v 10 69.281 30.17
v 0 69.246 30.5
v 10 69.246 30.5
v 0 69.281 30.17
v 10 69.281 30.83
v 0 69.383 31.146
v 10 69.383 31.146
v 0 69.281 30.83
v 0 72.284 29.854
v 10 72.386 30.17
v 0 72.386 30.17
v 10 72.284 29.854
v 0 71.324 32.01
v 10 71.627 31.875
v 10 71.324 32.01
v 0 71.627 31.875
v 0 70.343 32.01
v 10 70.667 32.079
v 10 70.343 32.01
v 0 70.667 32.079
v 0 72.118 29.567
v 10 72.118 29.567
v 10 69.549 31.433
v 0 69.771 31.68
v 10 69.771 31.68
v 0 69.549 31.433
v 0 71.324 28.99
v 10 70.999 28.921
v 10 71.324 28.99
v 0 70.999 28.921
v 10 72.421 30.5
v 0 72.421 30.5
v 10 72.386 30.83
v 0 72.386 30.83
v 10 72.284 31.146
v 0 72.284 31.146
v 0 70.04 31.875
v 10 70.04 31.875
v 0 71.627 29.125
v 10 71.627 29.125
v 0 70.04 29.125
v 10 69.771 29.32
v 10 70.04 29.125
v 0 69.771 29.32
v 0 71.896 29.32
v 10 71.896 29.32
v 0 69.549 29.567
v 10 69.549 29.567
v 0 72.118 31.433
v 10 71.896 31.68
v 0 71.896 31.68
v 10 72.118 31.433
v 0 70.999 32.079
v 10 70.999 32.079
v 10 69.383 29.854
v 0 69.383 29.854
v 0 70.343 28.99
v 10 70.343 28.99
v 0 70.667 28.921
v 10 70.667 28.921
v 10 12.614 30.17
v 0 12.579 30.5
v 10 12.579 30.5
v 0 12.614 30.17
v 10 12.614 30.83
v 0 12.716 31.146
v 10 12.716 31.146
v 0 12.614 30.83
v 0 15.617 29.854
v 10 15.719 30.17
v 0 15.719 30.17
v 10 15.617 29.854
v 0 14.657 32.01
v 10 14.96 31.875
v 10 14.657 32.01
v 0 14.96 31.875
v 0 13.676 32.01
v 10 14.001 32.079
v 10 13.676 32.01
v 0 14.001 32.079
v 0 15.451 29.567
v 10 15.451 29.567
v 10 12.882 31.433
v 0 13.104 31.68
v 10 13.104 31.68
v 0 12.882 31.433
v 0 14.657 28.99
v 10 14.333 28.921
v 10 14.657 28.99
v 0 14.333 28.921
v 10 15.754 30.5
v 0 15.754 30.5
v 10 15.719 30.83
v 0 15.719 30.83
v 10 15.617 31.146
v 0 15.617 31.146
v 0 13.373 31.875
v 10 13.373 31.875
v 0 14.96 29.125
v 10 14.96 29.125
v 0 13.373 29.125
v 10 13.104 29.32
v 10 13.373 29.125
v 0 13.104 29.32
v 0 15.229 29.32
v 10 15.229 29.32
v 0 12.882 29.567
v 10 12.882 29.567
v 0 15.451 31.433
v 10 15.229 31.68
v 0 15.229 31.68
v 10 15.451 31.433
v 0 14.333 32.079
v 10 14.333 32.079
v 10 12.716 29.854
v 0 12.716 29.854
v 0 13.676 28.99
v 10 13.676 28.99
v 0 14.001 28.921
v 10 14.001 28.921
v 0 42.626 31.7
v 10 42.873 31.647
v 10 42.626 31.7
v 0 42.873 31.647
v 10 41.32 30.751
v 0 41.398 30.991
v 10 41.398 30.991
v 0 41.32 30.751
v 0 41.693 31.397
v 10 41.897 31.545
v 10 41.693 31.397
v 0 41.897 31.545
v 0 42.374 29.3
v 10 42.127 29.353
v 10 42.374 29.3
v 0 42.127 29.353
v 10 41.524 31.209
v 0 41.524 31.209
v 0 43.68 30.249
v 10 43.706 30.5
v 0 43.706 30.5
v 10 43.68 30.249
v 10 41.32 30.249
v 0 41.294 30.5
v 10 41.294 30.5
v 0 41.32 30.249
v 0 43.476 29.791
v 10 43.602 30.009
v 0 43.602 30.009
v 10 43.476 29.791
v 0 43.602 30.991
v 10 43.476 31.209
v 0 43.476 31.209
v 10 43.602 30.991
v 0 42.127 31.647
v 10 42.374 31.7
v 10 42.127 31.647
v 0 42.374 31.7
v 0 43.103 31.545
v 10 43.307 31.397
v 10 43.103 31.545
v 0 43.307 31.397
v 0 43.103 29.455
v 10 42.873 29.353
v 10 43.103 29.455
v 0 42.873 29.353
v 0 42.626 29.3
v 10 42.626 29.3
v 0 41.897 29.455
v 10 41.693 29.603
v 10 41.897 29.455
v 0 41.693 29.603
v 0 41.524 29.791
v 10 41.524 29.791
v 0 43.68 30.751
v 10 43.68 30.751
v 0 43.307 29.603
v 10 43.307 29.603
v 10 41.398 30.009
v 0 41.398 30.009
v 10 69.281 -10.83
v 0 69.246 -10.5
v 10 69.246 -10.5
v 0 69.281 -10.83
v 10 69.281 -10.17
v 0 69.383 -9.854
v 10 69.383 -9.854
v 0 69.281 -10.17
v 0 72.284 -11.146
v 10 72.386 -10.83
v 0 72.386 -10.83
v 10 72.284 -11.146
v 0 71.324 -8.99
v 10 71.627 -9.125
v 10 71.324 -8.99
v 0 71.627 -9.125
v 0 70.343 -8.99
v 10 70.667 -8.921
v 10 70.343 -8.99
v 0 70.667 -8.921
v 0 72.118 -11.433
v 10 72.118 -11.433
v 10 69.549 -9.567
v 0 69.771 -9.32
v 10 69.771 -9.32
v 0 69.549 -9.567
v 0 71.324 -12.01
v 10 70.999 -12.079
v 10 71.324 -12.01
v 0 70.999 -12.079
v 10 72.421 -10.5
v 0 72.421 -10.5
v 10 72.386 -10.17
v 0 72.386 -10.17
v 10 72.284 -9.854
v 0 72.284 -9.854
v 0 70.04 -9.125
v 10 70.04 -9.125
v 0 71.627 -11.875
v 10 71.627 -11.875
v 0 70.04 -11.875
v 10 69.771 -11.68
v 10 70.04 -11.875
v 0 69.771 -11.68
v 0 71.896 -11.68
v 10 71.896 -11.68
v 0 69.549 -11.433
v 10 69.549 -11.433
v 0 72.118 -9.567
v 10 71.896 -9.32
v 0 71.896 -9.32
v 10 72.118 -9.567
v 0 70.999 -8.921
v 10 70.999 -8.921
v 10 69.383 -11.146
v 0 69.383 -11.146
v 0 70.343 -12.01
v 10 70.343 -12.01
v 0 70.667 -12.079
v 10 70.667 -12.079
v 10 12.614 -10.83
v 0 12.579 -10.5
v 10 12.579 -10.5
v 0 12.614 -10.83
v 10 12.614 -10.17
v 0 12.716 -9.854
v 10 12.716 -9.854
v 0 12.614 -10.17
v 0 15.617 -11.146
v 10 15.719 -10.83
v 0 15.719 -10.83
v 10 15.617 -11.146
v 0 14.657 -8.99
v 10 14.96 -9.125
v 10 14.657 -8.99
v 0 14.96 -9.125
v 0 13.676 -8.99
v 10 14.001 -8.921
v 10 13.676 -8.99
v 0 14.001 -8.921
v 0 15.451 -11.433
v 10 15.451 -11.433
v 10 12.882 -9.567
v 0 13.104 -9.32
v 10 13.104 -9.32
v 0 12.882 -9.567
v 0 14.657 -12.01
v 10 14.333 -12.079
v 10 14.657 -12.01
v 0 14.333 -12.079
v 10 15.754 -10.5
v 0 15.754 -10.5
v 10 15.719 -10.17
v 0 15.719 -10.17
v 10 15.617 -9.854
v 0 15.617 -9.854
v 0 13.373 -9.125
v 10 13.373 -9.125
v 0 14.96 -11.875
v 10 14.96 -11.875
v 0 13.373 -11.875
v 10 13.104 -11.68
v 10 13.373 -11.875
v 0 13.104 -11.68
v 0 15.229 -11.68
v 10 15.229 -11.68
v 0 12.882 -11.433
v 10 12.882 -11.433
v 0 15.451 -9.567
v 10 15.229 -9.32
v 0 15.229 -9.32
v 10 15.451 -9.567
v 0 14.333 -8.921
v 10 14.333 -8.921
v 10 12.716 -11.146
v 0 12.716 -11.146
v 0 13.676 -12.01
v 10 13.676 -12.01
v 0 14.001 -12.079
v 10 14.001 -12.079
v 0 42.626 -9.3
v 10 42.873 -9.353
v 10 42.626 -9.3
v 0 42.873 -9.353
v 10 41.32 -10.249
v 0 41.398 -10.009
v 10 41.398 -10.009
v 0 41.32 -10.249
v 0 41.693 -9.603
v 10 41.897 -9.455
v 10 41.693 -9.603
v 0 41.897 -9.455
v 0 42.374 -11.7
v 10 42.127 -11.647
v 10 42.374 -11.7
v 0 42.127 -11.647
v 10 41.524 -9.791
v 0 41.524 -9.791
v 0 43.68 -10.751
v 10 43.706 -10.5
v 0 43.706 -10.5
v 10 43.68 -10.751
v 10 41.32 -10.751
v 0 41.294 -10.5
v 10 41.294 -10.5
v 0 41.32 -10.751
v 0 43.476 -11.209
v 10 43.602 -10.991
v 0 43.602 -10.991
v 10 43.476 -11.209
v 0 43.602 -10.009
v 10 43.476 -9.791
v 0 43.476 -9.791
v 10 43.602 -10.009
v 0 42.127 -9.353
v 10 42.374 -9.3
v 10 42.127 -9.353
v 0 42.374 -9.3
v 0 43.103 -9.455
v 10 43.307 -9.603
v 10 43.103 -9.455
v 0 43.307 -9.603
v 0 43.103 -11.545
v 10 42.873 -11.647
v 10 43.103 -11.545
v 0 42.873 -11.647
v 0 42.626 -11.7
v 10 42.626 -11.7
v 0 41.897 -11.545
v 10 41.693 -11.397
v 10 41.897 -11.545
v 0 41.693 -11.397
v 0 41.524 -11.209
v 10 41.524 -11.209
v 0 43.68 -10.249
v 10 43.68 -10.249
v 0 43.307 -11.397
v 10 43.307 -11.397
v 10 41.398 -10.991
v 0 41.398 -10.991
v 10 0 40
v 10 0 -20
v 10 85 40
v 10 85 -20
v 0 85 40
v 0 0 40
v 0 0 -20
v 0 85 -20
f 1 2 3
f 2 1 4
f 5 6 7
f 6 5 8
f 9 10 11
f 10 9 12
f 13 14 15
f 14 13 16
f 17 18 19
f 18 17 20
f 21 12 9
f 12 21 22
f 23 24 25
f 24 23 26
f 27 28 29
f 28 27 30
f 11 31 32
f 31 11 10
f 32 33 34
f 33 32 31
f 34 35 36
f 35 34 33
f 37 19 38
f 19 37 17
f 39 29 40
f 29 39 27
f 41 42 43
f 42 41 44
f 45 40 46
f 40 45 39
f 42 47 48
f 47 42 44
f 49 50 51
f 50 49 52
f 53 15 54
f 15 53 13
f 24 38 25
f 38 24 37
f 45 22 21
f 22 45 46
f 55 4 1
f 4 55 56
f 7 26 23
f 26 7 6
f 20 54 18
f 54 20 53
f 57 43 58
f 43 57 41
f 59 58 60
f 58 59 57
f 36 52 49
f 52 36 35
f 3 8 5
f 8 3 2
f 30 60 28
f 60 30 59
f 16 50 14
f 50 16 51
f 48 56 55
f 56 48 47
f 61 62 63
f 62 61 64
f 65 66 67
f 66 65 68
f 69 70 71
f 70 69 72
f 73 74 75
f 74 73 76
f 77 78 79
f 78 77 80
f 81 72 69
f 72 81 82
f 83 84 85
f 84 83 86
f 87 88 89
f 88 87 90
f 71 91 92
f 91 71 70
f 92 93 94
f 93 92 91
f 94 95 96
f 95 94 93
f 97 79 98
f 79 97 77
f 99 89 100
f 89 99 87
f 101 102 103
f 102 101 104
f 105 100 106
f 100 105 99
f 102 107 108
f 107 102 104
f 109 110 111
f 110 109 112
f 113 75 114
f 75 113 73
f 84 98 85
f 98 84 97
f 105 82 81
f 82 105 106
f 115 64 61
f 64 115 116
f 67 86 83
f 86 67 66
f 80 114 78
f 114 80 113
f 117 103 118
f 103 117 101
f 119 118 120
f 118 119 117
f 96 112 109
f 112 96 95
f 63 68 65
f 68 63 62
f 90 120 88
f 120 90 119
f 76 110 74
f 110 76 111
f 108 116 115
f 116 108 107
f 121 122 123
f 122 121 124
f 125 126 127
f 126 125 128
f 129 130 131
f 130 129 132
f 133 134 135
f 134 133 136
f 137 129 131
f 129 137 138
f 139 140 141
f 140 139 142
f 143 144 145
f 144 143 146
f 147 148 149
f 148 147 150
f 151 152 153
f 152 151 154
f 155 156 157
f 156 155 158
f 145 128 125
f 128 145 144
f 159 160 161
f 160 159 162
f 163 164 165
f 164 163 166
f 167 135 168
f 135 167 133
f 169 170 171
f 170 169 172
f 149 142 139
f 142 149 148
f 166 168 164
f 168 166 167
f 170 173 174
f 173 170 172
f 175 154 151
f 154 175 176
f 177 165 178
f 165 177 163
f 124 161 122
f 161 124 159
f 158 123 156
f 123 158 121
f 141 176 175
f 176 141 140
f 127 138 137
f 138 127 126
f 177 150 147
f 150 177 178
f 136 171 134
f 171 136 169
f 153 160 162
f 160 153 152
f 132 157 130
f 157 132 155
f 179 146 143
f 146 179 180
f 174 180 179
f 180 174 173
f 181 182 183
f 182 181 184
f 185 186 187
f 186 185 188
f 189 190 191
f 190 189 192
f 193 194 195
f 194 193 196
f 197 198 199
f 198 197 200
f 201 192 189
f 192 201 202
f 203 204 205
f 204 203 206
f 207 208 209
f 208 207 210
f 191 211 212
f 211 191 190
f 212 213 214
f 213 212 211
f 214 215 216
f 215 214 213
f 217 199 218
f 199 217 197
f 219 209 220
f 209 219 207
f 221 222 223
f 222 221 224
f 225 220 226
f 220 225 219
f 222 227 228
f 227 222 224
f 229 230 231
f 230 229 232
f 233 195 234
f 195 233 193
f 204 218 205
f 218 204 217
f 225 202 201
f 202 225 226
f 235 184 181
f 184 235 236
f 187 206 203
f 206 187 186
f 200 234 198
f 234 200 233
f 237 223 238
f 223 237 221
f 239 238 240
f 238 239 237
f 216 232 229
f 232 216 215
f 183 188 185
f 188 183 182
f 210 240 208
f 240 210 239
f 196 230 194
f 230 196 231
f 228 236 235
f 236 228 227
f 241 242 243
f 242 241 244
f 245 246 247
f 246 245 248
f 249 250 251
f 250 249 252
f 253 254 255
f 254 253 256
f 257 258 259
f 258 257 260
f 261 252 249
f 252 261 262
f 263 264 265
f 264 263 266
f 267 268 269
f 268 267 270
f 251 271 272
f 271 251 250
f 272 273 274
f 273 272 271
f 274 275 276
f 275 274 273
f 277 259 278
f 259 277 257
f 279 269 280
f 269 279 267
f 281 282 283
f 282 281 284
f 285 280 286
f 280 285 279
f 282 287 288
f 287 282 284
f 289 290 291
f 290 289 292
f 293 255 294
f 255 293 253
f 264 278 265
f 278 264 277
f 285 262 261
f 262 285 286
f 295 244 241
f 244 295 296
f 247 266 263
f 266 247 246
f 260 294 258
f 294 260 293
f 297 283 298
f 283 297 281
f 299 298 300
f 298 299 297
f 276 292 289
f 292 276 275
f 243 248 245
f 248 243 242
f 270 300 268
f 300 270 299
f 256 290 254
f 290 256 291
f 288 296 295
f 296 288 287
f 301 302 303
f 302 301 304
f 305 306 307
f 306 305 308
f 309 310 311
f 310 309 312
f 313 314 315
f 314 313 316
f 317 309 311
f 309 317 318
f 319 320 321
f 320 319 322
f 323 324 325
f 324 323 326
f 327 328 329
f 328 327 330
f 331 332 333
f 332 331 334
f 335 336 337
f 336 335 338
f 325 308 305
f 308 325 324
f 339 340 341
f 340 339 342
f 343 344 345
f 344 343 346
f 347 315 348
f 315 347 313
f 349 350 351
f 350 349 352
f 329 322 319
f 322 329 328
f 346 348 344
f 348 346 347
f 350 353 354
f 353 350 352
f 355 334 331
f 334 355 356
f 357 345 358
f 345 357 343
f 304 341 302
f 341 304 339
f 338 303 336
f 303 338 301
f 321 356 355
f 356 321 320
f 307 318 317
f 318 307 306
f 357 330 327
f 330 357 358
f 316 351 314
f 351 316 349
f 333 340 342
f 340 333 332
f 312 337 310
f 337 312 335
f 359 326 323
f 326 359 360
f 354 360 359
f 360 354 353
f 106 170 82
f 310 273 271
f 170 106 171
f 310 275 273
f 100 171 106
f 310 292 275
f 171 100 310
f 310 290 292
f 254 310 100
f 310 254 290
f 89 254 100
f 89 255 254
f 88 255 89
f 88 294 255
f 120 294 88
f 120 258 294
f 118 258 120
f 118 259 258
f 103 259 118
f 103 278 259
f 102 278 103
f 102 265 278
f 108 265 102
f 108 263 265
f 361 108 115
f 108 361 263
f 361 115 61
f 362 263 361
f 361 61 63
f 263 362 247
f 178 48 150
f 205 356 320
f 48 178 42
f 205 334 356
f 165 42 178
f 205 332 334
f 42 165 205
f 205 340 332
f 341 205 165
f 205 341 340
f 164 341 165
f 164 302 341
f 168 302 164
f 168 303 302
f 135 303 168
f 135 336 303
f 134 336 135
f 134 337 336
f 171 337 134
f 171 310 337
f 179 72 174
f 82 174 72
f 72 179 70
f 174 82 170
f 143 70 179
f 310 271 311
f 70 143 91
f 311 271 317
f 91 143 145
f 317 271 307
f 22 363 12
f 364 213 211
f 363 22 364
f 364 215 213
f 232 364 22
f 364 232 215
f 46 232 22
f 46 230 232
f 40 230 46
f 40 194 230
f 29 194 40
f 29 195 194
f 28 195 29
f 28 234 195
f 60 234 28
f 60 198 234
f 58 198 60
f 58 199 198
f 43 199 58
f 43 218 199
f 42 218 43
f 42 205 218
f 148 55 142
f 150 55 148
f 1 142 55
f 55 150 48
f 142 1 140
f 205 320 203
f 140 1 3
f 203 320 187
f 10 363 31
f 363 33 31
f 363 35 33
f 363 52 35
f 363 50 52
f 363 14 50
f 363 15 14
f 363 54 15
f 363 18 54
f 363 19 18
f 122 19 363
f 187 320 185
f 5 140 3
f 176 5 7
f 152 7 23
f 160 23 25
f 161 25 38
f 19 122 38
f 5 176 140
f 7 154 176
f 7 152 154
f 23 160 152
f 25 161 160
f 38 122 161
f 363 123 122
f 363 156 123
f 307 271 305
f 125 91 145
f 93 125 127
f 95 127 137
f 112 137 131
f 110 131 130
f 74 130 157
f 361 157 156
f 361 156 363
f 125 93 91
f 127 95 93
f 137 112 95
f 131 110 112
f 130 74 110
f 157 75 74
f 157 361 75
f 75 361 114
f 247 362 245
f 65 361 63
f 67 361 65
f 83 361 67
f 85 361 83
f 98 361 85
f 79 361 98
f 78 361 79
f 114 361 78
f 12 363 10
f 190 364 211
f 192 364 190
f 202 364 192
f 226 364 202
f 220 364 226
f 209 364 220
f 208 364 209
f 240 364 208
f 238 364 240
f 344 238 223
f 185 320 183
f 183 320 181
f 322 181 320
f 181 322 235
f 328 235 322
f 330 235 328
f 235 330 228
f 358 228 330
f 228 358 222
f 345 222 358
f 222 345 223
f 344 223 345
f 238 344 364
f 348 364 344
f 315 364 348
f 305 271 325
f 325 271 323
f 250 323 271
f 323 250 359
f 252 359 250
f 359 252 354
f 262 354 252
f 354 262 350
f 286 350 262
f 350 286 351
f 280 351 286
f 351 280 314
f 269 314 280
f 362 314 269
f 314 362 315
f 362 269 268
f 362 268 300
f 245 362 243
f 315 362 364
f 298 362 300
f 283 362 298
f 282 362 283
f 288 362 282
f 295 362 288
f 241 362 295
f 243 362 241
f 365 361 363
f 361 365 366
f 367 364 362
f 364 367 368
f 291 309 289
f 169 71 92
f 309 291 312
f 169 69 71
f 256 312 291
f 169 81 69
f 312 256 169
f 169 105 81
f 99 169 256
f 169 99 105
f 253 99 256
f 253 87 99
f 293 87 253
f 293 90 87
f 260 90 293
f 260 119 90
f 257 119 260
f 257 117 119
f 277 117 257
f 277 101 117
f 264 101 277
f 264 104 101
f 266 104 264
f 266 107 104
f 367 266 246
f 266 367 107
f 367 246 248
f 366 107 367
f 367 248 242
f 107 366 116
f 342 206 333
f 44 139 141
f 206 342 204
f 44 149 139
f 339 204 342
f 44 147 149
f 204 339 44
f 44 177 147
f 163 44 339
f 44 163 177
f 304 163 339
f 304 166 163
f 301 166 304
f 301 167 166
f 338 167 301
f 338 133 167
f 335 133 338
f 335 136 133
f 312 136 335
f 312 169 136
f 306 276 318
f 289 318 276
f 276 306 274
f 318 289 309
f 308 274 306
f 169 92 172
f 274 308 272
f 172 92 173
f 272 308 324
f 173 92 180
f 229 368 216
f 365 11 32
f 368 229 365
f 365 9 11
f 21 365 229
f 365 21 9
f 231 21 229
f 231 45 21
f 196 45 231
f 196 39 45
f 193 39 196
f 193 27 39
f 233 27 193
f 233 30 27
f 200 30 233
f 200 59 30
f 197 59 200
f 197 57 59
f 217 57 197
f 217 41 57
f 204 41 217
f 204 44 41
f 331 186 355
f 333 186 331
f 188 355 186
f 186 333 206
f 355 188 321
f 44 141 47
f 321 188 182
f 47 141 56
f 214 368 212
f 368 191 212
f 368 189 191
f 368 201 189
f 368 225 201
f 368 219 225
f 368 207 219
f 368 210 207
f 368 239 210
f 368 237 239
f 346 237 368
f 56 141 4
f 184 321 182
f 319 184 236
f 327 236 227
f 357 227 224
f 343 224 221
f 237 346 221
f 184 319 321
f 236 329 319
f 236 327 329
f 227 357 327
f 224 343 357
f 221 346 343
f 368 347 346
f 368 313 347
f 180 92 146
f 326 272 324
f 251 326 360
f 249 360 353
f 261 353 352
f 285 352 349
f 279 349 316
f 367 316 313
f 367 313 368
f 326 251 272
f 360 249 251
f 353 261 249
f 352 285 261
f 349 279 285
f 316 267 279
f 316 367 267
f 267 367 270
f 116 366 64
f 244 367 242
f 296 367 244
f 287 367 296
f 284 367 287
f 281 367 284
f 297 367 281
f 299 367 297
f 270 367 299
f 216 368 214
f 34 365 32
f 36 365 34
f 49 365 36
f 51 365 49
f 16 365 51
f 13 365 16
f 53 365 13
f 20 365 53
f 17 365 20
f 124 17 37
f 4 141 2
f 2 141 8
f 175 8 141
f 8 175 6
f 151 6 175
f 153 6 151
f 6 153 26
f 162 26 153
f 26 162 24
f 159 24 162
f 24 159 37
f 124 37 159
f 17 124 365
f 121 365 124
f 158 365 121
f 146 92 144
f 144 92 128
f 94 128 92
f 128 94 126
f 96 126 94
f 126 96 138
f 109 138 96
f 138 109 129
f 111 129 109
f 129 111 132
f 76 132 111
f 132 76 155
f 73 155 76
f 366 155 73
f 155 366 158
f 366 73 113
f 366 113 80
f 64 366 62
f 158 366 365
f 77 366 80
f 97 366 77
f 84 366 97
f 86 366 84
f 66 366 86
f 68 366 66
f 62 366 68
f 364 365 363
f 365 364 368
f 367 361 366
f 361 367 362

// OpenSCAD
// file: short_wall.scad
include <defs.scad>
use <assembly.scad>
use <slab.scad>

module short_wall_holes()
{
    
}

module ShortWall()
{
    cube([ short_wall_x, short_wall_y, short_wall_z]);
}

module _put_screw_holes(rot=0)
{
    translate([0,slab_thickness/2,short_wall_z/5])
    {
        rotate([0,90,0+rot])
            cylinder(wall_screw_l, wall_screw_ri, wall_screw_ri);
        rotate([0,90,180+rot])
            cylinder(forever, wall_screw_ri, wall_screw_ri);
    }
    translate([0,slab_thickness/2,short_wall_z*4/5])
    {
        rotate([0,90,0+rot])
            cylinder(wall_screw_l, wall_screw_ri, wall_screw_ri);
        rotate([0,90,180+rot])
            cylinder(forever, wall_screw_ri, wall_screw_ri);
    }

}

module make_short_wall_holes()
{
    to_short_wall_positions()
    {
        translate([short_wall_cut_offset,0,0])
        {
            cube([short_wall_cut_x, short_wall_cut_y, short_wall_cut_z]);
        }
        translate([tall_wall_y - short_wall_cut_offset - short_wall_cut_x,0,0])
        {
            cube([short_wall_cut_x, short_wall_cut_y, short_wall_cut_z]);
        }

        /*_put_screw_holes();*/
        /*translate([slab_l,0,0])*/
            /*_put_screw_holes(180);*/
    }
}


difference()
{
    short_wall_origin()
    {
        ShortWall();
    }
    Holes();
    make_short_wall_holes();
}
// file: slab.scad
include <defs.scad>


module make_slab()
{
    cube([slab_x, slab_y, slab_z]);
}

module make_linear_hole()
{
    rotate([-90,0,0]) cylinder(slab_y,linear_bearing_or,linear_bearing_or);
    // infinite hole
    rotate([-90,0,180]) cylinder(forever,linear_bearing_ir,linear_bearing_ir);
}
module make_bearing_insert()
{
    rotate([-90,0,0]) cylinder(bearing_y,bearing_or,bearing_or);
    // infinite hole
    r = bearing_ir - threaded_rod_r_grip;
    rotate([-90,0,180]) cylinder(forever,r,r);
}


module make_slab_holes()
{
    translate([linear_bearing_offset,0,short_wall_z/2])
    {
        if ($children > 0) children(0);
    }
    translate([tall_wall_y - linear_bearing_offset,0,short_wall_z/2])
    {
        if ($children > 2) children(2);
    }
    translate([tall_wall_y/2,0,short_wall_z/2])
    {
        if ($children > 1) children(1);
    }
}

difference()
{
    color ("green") make_slab();
    make_slab_holes()
    {
        make_linear_hole();
        make_bearing_insert();
        make_linear_hole();
    }
}
// file: assembly.scad
include <defs.scad>
include <slab.scad>
use <short_wall.scad>
use <tall_wall.scad>


module to_slab_positions_y(slab_offset = slaby_o)
{
    // close short slab
    translate([tall_wall_x + ptol/2,
            short_wall_y + ptol + slab_offset,
            0]) children();

    // far short slab
    translate([tall_wall_x + ptol/2, 
            tall_wall_y - (short_wall_y+slab_y)  - slab_offset,
            0])
        translate([tall_wall_y,slab_y,0]) rotate([0,0,180]) children();
}
module to_slab_positions_x(slab_offset = slabx_o)
{
    // right top slab
    translate([ tall_wall_x + tall_wall_y - slab_y - slab_offset,0,short_wall_z + ptol])
        translate([slab_y,0,0]) rotate([0,0,90]) children();

    // right bottom slab
    translate([tall_wall_x + tall_wall_y - slab_y - slab_offset,0,-short_wall_z - ptol])
        translate([slab_y,0,0]) rotate([0,0,90]) children();

    // left top slab
    translate([tall_wall_x + ptol + slab_offset,0, short_wall_z + ptol])
        translate([0,tall_wall_y,0]) rotate([0,0,-90]) children();

    // left bottom slab
    translate([tall_wall_x + ptol + slab_offset,0, -short_wall_z - ptol])
        translate([0,tall_wall_y,0]) rotate([0,0,-90]) children();
}
module to_slab_positions(slab_offsetx = slabx_o, slab_offsety = slaby_o)
{
    to_slab_positions_x(slab_offsetx) children();
    to_slab_positions_y(slab_offsety) children();
}

module short_wall_origin()
{
    translate([tall_wall_x+ptol/2,0,0])
    {
        children();
    }
}

module to_short_wall_positions()
{
    short_wall_origin()
    {
        children();
        translate([0, inside_width + short_wall_y + ptol]) children();
    }
}


module tall_wall_origin()
{
    translate([0,0,-short_wall_z])
    {
        children();
    }
}


module Solids()
{

    to_short_wall_positions()
    {
        color("orange") ShortWall();
    }

    tall_wall_origin()
    {
        TallWall();
        translate([tall_wall_x + tall_wall_y + ptol,0,0])
        {
            TallWall();
        }
    }

    to_slab_positions()
    {
        color("green") make_slab();
    }

}

module Holes()
{
    to_slab_positions()
    {
        make_slab_holes()
        {
            make_linear_hole();
            make_bearing_insert();
            make_linear_hole();
        }
    }
    make_short_wall_holes();
}
// file: defs.scad
// Special
function in2mm( mm ) = mm*25.4;
function mm( mm ) = mm;
$fs = 0.1;
forever = 1000;
//

// Configuration
SCALE = 2;  
model_threads = 0;  // inversely proportional to size
apply_mold = 0;
apply_pin_matrix = 0;
inside_width = 130/SCALE;
//

// Walls

_wall_thickness = 20/SCALE;

short_wall_x = inside_width + _wall_thickness*2;
short_wall_y = _wall_thickness;
short_wall_z = 40/SCALE;

tall_wall_x = _wall_thickness;
tall_wall_y = short_wall_x;
tall_wall_z = short_wall_z * 3;


short_wall_cut_y = short_wall_y;
short_wall_cut_x = tall_wall_x/2;
short_wall_cut_z = short_wall_z*4/5;
short_wall_cut_offset = tall_wall_x/2;

slab_shortener = 4/SCALE;
slab_wall = short_wall_z/2;

hole_rad = 2/SCALE;
ptol = 1/SCALE;
//

// Slabs and holes

_slab_thickness = in2mm(1.0/4);

slab_x = tall_wall_y;
slab_y = _slab_thickness;
slab_z = short_wall_z;


linear_bearing_offset = tall_wall_y/6;
linear_bearing_or = in2mm(1/4/2);
linear_bearing_ir = in2mm(1/8/2);

bearing_or = in2mm(1.0/4/2);
bearing_ir = in2mm(1.0/8/2);
bearing_y = in2mm(3.0/32);

threaded_rod_r_grip = in2mm(0.015);  // how much to shrink hole on threaded rod to get traction
//

// Assembly and appearance

slabx_o = in2mm(0.1);
slaby_o = in2mm(0.1);

pin_z = 150/SCALE;
pin_x = 2/SCALE;
matrix_pad_x = 8;
matrix_pad_y = 2;
pin_pad = 0.2;
//
// main file
include <defs.scad>
use <assembly.scad>
use <slab.scad>

module TallWall()
{
    cube([tall_wall_x, tall_wall_y, tall_wall_z ]);
}


difference()
{
    tall_wall_origin()
    {
        TallWall();
    }
    Holes();
}
